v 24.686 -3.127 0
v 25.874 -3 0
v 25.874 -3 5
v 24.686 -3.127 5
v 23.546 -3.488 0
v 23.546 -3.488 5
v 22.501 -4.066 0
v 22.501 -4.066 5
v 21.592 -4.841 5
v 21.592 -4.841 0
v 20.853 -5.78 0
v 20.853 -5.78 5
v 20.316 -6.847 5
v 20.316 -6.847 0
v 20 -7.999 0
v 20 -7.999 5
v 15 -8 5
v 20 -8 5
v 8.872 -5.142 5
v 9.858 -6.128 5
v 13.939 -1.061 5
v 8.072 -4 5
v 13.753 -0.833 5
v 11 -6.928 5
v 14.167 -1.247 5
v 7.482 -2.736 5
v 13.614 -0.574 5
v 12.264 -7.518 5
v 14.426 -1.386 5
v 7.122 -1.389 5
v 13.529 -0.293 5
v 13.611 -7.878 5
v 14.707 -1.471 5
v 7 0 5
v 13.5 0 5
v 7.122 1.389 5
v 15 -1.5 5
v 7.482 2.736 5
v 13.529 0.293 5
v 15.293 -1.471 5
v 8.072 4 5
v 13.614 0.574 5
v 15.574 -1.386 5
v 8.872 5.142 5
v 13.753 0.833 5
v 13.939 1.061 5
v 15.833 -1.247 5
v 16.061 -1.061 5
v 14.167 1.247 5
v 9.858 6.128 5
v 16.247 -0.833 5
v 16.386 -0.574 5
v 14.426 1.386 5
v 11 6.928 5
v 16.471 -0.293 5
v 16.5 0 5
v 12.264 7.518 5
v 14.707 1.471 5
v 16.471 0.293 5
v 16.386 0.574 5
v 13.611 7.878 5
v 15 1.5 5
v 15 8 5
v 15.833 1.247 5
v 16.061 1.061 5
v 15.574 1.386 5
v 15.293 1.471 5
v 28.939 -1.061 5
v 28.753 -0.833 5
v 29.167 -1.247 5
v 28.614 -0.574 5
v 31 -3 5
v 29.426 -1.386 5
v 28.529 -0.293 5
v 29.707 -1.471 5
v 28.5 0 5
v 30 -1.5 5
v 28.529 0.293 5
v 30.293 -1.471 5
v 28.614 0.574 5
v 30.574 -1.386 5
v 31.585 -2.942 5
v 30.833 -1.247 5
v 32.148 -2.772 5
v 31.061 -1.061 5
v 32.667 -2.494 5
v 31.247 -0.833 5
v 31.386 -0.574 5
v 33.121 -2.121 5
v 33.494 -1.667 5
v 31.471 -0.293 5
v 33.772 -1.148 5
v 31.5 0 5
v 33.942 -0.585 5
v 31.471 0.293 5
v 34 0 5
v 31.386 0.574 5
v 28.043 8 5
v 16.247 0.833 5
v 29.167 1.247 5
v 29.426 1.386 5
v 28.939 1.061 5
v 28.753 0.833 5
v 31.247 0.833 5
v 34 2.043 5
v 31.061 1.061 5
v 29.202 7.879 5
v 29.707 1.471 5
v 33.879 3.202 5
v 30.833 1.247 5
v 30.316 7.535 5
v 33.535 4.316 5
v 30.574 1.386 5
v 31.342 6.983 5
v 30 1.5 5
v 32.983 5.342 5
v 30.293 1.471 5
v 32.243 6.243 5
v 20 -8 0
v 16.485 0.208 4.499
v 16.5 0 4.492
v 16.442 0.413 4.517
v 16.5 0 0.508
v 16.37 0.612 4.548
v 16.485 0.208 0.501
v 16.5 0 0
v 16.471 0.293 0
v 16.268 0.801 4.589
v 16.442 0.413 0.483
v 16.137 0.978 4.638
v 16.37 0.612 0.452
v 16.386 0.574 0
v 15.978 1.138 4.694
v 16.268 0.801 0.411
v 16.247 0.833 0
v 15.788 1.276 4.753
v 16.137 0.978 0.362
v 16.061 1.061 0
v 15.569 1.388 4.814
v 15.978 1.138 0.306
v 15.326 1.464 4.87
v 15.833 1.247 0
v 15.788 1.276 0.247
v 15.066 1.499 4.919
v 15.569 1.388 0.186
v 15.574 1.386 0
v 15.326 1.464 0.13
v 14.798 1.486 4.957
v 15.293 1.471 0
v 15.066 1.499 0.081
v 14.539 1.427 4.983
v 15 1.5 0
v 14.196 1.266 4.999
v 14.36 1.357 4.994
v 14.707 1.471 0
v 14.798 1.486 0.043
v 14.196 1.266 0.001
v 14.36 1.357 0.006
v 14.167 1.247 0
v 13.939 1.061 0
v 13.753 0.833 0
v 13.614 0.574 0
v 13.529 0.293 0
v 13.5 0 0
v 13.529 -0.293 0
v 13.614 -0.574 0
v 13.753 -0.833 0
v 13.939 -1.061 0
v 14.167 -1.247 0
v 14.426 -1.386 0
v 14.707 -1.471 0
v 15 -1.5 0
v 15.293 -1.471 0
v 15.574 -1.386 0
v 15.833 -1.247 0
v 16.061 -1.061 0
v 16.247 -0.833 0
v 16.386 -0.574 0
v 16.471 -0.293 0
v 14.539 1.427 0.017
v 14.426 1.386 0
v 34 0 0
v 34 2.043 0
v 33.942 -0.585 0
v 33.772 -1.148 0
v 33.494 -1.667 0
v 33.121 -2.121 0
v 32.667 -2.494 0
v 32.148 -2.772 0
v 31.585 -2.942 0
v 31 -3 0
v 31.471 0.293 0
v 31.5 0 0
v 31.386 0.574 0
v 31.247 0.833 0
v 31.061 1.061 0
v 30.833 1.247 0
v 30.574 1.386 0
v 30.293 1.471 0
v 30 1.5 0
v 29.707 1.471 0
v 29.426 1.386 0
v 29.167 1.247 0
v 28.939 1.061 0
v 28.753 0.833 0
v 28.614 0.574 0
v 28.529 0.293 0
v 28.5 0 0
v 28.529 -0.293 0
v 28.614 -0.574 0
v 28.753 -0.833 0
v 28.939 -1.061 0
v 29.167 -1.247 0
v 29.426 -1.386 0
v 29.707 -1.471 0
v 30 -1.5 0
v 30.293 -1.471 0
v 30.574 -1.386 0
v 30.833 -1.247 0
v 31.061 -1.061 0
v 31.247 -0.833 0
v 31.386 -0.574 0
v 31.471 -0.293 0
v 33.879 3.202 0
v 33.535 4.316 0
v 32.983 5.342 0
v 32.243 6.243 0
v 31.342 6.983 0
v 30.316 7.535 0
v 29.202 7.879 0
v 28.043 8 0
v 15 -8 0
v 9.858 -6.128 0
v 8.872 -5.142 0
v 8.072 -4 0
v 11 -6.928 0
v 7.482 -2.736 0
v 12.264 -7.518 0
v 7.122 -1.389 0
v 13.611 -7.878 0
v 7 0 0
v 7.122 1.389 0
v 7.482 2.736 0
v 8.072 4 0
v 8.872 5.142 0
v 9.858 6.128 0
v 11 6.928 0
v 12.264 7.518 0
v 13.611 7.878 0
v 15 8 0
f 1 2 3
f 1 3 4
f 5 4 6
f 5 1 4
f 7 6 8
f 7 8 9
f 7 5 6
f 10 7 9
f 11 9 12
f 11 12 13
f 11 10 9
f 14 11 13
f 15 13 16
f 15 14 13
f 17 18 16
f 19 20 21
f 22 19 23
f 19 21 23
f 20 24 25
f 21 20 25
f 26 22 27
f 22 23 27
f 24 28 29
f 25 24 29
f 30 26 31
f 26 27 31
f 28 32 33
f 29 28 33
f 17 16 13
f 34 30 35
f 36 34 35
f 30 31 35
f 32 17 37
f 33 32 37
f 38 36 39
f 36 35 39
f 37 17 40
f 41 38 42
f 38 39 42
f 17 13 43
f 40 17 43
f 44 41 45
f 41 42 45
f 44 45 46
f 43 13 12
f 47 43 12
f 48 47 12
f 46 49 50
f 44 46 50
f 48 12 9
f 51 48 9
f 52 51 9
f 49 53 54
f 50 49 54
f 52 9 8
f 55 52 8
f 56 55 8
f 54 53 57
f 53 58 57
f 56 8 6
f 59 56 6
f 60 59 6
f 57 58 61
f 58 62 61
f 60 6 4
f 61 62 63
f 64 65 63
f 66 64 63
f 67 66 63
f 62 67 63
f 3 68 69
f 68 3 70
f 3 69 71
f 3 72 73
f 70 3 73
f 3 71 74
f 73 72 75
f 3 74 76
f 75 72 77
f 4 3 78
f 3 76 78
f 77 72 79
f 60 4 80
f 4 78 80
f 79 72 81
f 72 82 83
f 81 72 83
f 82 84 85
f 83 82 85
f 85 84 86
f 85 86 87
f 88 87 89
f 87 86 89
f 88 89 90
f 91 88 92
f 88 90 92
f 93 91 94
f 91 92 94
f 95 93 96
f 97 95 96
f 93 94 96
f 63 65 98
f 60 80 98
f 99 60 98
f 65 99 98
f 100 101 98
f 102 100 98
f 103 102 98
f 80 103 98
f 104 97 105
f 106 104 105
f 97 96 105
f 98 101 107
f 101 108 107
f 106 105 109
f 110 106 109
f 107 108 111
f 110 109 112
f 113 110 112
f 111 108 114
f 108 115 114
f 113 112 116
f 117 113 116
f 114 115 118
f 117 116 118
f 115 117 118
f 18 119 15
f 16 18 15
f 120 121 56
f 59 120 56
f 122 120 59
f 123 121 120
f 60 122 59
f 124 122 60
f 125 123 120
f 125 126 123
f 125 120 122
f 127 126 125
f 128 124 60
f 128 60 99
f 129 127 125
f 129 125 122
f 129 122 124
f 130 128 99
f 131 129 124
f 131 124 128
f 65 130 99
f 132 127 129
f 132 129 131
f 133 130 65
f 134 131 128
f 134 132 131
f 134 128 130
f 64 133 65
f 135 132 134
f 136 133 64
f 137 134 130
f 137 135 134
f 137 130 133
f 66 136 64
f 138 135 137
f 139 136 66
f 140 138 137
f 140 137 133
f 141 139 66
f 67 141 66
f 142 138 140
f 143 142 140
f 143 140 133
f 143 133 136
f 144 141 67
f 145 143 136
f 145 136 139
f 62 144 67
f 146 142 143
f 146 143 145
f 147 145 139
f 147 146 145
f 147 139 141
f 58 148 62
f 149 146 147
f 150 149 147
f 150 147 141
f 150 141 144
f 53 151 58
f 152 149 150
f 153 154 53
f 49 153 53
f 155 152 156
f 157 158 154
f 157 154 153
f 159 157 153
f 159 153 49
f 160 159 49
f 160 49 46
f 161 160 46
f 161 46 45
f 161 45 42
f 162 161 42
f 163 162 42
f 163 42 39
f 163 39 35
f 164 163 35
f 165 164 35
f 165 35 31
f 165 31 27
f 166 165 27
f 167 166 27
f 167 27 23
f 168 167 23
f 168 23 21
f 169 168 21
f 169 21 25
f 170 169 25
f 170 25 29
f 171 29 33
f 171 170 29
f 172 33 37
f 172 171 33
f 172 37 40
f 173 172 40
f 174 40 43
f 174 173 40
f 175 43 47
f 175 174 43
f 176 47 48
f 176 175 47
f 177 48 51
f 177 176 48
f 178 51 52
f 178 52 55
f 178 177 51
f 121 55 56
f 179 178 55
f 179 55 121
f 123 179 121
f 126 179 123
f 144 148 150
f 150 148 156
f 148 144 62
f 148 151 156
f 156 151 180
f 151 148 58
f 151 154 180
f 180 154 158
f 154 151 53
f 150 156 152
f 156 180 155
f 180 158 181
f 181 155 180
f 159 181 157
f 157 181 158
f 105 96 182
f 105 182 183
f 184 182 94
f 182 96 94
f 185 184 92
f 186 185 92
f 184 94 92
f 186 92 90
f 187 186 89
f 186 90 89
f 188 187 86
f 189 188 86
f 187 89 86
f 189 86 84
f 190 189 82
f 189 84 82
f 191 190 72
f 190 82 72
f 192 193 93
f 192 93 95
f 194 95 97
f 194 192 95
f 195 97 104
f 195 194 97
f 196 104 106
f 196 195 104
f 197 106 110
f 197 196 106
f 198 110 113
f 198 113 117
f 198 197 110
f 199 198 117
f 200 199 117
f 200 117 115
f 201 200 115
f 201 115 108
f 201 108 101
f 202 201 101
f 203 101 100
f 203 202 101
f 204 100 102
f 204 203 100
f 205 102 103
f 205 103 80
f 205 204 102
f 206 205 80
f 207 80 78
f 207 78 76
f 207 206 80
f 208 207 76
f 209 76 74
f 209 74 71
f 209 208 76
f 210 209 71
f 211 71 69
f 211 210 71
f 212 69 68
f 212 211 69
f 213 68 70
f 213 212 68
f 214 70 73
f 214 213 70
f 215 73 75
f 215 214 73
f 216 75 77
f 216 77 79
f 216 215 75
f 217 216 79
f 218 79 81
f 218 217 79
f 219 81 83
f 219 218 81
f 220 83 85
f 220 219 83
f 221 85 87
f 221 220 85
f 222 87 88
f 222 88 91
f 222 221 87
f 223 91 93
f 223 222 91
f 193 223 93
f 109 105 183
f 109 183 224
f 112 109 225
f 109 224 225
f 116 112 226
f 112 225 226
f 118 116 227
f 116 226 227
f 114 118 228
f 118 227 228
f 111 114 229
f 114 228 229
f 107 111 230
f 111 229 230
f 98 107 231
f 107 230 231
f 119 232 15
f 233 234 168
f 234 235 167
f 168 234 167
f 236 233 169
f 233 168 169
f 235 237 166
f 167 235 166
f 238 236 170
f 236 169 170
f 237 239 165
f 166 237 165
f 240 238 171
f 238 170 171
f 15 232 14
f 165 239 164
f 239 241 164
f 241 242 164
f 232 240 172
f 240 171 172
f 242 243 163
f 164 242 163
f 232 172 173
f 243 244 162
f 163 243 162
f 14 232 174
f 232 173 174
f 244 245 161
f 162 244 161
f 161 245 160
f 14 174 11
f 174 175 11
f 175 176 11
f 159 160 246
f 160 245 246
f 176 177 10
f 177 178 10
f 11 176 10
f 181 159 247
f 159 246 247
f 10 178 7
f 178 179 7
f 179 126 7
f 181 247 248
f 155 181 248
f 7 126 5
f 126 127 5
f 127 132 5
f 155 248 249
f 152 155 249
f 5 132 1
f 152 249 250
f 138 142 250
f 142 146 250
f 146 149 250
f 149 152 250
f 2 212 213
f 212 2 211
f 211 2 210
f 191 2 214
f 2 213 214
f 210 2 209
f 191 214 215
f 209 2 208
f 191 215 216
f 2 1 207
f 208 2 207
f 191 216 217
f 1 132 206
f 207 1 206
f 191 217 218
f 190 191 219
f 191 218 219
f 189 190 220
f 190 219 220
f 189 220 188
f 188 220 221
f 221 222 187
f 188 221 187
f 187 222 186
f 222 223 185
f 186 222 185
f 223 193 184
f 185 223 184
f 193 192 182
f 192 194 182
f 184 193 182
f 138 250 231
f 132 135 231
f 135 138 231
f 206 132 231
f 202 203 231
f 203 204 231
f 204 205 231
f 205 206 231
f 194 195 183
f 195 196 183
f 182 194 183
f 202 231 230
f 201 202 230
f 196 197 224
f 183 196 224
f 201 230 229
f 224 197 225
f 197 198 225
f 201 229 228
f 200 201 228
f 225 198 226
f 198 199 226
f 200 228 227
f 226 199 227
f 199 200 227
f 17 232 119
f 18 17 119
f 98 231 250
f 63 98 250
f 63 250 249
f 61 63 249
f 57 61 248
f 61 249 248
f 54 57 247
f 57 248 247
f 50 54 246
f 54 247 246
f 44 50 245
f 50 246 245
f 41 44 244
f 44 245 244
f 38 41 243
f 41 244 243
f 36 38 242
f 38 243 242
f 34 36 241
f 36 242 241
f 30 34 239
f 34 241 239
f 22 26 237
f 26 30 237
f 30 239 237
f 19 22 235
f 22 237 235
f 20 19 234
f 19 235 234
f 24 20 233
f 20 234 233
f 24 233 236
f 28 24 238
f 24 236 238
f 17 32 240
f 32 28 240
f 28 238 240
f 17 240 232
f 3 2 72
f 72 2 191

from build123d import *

# Parameters (mm, degrees)
ESQUISSE1_R        = 1.5
BOSS_EXTRU_1_DEPTH = 5
CONG_1_R           = 6
CONG_2_R           = 3


with BuildPart() as part:
    # Esquisse1 → Boss.-Extru.1 (new body)
    with BuildSketch(Plane.XY):
        with BuildLine():
            Line((20, -3), (34, -3))
            Line((34, -3), (34, 8))
            Line((34, 8), (15, 8))
            ThreePointArc((15, 8), (7, 0), (15, -8))
            Line((15, -8), (20, -8))
            Line((20, -8), (20, -3))
        make_face()
        with Locations((15, 0)):
            Circle(ESQUISSE1_R, mode=Mode.SUBTRACT)
        with Locations((30, 0)):
            Circle(ESQUISSE1_R, mode=Mode.SUBTRACT)
    extrude(amount=BOSS_EXTRU_1_DEPTH)

    # Congé1
    # the kernel refuses this fillet: 6 mm, written as the material it adds along each edge
    with BuildSketch(Plane(origin=(20, -3, 0), x_dir=(-2.958065230920737e-05, -0.9999999995624925, 0), z_dir=(0, 0, 1))) as cong_1_piece_1:
        with BuildLine():
            CenterArc((5.999675, 5.916130485), CONG_1_R, 180.001694847, 80.407142396)
            Line((-0.000324998, 5.915953002), (-0.120324998, 5.915949452))
            ThreePointArc((-0.120324998, 5.915949452), (-0.120087499, 2.957972953), (-0.12, -3.55e-06))
            Line((-0.12, -3.55e-06), (3.55e-06, -0.12))
            ThreePointArc((3.55e-06, -0.12), (2.49999105, -0.119926049), (4.979981005, -0.11832261))
            Line((4.979981005, -0.11832261), (4.999975005, 0))
        make_face()
    extrude(amount=5)
    # the kernel refuses this fillet: 6 mm, written as the material it takes off along each edge
    with BuildSketch(Plane(origin=(34, 8, -14.999625005), x_dir=(-0.9999999996874845, 2.500062500775405e-05, 0), z_dir=(0, 0, 1))) as cong_1_2_piece_1:
        with BuildLine():
            CenterArc((5.999699998, 5.999999998), CONG_1_R, 180.00143243, 90)
            Line((-0.0003, 5.999849994), (-0.1203, 5.999846994))
            ThreePointArc((-0.1203, 5.999846994), (-0.120075, 2.999921999), (-0.12, -3e-06))
            Line((-0.12, -3e-06), (3e-06, -0.12))
            ThreePointArc((3e-06, -0.12), (2.999927999, -0.119925), (5.999853002, -0.12))
            Line((5.999853002, -0.12), (5.999850002, 0))
        make_face()
    extrude(amount=34.999250009, mode=Mode.SUBTRACT)
    with BuildSketch(Plane(origin=(20, -22.789882526, 5), x_dir=(2.9580652309207366e-05, 0, -0.9999999995624925), z_dir=(0, 1, 0))) as cong_1_2_piece_2:
        with BuildLine():
            CenterArc((5.999675, 5.916130485), CONG_1_R, 180.001694847, 80.407142396)
            Line((-0.000324998, 5.915953002), (-0.120324998, 5.915949452))
            ThreePointArc((-0.120324998, 5.915949452), (-0.120087499, 2.957972953), (-0.12, -3.55e-06))
            Line((-0.12, -3.55e-06), (3.55e-06, -0.12))
            ThreePointArc((3.55e-06, -0.12), (2.49999105, -0.119926049), (4.979981005, -0.11832261))
            Line((4.979981005, -0.11832261), (4.999975005, 0))
        make_face()
    extrude(amount=29.580664771, mode=Mode.SUBTRACT)
    with BuildSketch(Plane(origin=(20, -22.789882526, 0), x_dir=(2.9580652309207366e-05, 0, 0.9999999995624925), z_dir=(0, 1, 0))) as cong_1_2_piece_3:
        with BuildLine():
            CenterArc((5.999675, -5.916130485), CONG_1_R, 99.591162758, 80.407142396)
            Line((-0.000324998, -5.915953002), (-0.120324998, -5.915949452))
            ThreePointArc((-0.120324998, -5.915949452), (-0.120087499, -2.957972953), (-0.12, 3.55e-06))
            Line((-0.12, 3.55e-06), (3.55e-06, 0.12))
            ThreePointArc((3.55e-06, 0.12), (2.49999105, 0.119926049), (4.979981005, 0.11832261))
            Line((4.979981005, 0.11832261), (4.999975005, 0))
        make_face()
    extrude(amount=29.580664771, mode=Mode.SUBTRACT)

    # Congé2
    cong_2_edges = [part.edges().sort_by_distance(p)[0] for p in [
        (34, -3, 2.5),
    ]]
    fillet(cong_2_edges, radius=CONG_2_R)


solid = part.part
